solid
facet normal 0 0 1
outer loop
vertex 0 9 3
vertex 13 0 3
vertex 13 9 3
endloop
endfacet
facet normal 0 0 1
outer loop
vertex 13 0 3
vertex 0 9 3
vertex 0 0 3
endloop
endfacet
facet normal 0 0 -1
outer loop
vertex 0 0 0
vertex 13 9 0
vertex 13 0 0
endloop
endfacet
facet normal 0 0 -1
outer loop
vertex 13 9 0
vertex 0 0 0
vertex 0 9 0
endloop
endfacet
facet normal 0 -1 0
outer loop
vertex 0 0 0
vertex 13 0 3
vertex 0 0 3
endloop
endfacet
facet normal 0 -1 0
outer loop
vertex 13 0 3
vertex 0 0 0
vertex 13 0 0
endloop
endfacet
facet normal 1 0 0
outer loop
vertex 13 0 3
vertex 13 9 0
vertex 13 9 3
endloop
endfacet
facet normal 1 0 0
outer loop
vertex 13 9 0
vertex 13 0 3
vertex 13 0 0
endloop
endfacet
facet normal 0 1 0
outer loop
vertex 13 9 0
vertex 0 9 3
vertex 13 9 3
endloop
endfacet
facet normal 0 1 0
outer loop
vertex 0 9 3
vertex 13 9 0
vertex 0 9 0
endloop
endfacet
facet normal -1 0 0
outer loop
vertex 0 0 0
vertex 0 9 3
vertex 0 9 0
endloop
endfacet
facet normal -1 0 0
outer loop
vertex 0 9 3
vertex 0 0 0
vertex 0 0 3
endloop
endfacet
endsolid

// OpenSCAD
// Generated by SolidPython 1.0.1 on 2020-07-29 00:46:55


cube(size = [13, 9, 3]);
/***********************************************
*********      SolidPython code:      **********
************************************************
 
# import packages: SolidPython
from solid import *
from solid.utils import *
from itertools import chain, combinations, permutations


class Resize:

    def __init__(self, scad_file):
        self.scad_file = scad_file
        #self.scad_file = import_scad(scad_file)
        # cone/cylinder param:
        self.r1 = 0
        self.r2 = 0
        self.h = 0
        # rectangular prism param:
        self.w = 0
        self.l = 0
        # ellipse param:
        self.r = 0

    # import OpenScad code (file name corresponds to shape)


    # classify shape + parameters
    def assign(self, param1, param2, param3):
        if self.scad_file == 'cone.scad':
            self.r1 = param1
            self.r2 = param2
            self.h = param3
        elif self.scad_file == 'cylinder.scad':
            self.r1 = param1
            self.r2 = param2
            self.h = param3
        elif self.scad_file == 'rectangularPrism.scad':
            self.h = param1
            self.l = param2
            self.w = param3
        else:
            self.r = param1
            self.h = param2

    # resize parameters
    def iterate(self):
        x = range(3, 20, 2)
        i = 1
        if self.scad_file == 'cone.scad':
            tempList = list(permutations(x, 2))
            for temp in tempList:
                param1 = temp[0]
                param2 = temp[1]
                filepath = 'produced_scad_files/' + 'cone' + str(param1) + '_' + str(param2) + '_' + '.scad'
                scad_render_to_file(cylinder(h=param1, r1=param2, r2=0), filepath)

        elif self.scad_file == 'cylinder.scad':
            tempList = list(permutations(x, 3))
            for temp in tempList:
                param1 = temp[0]
                param2 = temp[1]
                filepath = 'produced_scad_files/' + 'cylinder' + str(param1) + '_' + str(param2) + '_' + '.scad'
                scad_render_to_file(cylinder(h=param1, r1=param2, r2=param2), filepath)

        elif self.scad_file == 'rectangularPrism.scad':
            tempList = list(permutations(x, 3))
            for temp in tempList:
                param1 = temp[0]
                param2 = temp[1]
                param3 = temp[2]
                filepath = 'produced_scad_files/' + 'rectangularPrism' + str(param1) + '_' + str(param2) + '_' + str(
                    param3) + '.scad'
                scad_render_to_file(cube(size=(param1, param2, param3)), filepath)

        elif self.scad_file == 'ellipse.scad':
            tempList = list(permutations(x, 4))
            for temp in tempList:
                param1 = temp[0]
                param2 = temp[1]
                param3 = temp[2]
                param4 = temp[3]
                filepath = 'produced_scad_files/' + 'ellipse' + str(param1) + '_' + str(param2) + '_' + str(param3) + '_' + str(param4) + '.scad'
                scad_render_to_file(scale([param1, param2, param3])(sphere(r=param4)), filepath)

    def render_to_scadfile(self):
        scad_render_to_file(scad, 'example.scad') 
 
************************************************/
